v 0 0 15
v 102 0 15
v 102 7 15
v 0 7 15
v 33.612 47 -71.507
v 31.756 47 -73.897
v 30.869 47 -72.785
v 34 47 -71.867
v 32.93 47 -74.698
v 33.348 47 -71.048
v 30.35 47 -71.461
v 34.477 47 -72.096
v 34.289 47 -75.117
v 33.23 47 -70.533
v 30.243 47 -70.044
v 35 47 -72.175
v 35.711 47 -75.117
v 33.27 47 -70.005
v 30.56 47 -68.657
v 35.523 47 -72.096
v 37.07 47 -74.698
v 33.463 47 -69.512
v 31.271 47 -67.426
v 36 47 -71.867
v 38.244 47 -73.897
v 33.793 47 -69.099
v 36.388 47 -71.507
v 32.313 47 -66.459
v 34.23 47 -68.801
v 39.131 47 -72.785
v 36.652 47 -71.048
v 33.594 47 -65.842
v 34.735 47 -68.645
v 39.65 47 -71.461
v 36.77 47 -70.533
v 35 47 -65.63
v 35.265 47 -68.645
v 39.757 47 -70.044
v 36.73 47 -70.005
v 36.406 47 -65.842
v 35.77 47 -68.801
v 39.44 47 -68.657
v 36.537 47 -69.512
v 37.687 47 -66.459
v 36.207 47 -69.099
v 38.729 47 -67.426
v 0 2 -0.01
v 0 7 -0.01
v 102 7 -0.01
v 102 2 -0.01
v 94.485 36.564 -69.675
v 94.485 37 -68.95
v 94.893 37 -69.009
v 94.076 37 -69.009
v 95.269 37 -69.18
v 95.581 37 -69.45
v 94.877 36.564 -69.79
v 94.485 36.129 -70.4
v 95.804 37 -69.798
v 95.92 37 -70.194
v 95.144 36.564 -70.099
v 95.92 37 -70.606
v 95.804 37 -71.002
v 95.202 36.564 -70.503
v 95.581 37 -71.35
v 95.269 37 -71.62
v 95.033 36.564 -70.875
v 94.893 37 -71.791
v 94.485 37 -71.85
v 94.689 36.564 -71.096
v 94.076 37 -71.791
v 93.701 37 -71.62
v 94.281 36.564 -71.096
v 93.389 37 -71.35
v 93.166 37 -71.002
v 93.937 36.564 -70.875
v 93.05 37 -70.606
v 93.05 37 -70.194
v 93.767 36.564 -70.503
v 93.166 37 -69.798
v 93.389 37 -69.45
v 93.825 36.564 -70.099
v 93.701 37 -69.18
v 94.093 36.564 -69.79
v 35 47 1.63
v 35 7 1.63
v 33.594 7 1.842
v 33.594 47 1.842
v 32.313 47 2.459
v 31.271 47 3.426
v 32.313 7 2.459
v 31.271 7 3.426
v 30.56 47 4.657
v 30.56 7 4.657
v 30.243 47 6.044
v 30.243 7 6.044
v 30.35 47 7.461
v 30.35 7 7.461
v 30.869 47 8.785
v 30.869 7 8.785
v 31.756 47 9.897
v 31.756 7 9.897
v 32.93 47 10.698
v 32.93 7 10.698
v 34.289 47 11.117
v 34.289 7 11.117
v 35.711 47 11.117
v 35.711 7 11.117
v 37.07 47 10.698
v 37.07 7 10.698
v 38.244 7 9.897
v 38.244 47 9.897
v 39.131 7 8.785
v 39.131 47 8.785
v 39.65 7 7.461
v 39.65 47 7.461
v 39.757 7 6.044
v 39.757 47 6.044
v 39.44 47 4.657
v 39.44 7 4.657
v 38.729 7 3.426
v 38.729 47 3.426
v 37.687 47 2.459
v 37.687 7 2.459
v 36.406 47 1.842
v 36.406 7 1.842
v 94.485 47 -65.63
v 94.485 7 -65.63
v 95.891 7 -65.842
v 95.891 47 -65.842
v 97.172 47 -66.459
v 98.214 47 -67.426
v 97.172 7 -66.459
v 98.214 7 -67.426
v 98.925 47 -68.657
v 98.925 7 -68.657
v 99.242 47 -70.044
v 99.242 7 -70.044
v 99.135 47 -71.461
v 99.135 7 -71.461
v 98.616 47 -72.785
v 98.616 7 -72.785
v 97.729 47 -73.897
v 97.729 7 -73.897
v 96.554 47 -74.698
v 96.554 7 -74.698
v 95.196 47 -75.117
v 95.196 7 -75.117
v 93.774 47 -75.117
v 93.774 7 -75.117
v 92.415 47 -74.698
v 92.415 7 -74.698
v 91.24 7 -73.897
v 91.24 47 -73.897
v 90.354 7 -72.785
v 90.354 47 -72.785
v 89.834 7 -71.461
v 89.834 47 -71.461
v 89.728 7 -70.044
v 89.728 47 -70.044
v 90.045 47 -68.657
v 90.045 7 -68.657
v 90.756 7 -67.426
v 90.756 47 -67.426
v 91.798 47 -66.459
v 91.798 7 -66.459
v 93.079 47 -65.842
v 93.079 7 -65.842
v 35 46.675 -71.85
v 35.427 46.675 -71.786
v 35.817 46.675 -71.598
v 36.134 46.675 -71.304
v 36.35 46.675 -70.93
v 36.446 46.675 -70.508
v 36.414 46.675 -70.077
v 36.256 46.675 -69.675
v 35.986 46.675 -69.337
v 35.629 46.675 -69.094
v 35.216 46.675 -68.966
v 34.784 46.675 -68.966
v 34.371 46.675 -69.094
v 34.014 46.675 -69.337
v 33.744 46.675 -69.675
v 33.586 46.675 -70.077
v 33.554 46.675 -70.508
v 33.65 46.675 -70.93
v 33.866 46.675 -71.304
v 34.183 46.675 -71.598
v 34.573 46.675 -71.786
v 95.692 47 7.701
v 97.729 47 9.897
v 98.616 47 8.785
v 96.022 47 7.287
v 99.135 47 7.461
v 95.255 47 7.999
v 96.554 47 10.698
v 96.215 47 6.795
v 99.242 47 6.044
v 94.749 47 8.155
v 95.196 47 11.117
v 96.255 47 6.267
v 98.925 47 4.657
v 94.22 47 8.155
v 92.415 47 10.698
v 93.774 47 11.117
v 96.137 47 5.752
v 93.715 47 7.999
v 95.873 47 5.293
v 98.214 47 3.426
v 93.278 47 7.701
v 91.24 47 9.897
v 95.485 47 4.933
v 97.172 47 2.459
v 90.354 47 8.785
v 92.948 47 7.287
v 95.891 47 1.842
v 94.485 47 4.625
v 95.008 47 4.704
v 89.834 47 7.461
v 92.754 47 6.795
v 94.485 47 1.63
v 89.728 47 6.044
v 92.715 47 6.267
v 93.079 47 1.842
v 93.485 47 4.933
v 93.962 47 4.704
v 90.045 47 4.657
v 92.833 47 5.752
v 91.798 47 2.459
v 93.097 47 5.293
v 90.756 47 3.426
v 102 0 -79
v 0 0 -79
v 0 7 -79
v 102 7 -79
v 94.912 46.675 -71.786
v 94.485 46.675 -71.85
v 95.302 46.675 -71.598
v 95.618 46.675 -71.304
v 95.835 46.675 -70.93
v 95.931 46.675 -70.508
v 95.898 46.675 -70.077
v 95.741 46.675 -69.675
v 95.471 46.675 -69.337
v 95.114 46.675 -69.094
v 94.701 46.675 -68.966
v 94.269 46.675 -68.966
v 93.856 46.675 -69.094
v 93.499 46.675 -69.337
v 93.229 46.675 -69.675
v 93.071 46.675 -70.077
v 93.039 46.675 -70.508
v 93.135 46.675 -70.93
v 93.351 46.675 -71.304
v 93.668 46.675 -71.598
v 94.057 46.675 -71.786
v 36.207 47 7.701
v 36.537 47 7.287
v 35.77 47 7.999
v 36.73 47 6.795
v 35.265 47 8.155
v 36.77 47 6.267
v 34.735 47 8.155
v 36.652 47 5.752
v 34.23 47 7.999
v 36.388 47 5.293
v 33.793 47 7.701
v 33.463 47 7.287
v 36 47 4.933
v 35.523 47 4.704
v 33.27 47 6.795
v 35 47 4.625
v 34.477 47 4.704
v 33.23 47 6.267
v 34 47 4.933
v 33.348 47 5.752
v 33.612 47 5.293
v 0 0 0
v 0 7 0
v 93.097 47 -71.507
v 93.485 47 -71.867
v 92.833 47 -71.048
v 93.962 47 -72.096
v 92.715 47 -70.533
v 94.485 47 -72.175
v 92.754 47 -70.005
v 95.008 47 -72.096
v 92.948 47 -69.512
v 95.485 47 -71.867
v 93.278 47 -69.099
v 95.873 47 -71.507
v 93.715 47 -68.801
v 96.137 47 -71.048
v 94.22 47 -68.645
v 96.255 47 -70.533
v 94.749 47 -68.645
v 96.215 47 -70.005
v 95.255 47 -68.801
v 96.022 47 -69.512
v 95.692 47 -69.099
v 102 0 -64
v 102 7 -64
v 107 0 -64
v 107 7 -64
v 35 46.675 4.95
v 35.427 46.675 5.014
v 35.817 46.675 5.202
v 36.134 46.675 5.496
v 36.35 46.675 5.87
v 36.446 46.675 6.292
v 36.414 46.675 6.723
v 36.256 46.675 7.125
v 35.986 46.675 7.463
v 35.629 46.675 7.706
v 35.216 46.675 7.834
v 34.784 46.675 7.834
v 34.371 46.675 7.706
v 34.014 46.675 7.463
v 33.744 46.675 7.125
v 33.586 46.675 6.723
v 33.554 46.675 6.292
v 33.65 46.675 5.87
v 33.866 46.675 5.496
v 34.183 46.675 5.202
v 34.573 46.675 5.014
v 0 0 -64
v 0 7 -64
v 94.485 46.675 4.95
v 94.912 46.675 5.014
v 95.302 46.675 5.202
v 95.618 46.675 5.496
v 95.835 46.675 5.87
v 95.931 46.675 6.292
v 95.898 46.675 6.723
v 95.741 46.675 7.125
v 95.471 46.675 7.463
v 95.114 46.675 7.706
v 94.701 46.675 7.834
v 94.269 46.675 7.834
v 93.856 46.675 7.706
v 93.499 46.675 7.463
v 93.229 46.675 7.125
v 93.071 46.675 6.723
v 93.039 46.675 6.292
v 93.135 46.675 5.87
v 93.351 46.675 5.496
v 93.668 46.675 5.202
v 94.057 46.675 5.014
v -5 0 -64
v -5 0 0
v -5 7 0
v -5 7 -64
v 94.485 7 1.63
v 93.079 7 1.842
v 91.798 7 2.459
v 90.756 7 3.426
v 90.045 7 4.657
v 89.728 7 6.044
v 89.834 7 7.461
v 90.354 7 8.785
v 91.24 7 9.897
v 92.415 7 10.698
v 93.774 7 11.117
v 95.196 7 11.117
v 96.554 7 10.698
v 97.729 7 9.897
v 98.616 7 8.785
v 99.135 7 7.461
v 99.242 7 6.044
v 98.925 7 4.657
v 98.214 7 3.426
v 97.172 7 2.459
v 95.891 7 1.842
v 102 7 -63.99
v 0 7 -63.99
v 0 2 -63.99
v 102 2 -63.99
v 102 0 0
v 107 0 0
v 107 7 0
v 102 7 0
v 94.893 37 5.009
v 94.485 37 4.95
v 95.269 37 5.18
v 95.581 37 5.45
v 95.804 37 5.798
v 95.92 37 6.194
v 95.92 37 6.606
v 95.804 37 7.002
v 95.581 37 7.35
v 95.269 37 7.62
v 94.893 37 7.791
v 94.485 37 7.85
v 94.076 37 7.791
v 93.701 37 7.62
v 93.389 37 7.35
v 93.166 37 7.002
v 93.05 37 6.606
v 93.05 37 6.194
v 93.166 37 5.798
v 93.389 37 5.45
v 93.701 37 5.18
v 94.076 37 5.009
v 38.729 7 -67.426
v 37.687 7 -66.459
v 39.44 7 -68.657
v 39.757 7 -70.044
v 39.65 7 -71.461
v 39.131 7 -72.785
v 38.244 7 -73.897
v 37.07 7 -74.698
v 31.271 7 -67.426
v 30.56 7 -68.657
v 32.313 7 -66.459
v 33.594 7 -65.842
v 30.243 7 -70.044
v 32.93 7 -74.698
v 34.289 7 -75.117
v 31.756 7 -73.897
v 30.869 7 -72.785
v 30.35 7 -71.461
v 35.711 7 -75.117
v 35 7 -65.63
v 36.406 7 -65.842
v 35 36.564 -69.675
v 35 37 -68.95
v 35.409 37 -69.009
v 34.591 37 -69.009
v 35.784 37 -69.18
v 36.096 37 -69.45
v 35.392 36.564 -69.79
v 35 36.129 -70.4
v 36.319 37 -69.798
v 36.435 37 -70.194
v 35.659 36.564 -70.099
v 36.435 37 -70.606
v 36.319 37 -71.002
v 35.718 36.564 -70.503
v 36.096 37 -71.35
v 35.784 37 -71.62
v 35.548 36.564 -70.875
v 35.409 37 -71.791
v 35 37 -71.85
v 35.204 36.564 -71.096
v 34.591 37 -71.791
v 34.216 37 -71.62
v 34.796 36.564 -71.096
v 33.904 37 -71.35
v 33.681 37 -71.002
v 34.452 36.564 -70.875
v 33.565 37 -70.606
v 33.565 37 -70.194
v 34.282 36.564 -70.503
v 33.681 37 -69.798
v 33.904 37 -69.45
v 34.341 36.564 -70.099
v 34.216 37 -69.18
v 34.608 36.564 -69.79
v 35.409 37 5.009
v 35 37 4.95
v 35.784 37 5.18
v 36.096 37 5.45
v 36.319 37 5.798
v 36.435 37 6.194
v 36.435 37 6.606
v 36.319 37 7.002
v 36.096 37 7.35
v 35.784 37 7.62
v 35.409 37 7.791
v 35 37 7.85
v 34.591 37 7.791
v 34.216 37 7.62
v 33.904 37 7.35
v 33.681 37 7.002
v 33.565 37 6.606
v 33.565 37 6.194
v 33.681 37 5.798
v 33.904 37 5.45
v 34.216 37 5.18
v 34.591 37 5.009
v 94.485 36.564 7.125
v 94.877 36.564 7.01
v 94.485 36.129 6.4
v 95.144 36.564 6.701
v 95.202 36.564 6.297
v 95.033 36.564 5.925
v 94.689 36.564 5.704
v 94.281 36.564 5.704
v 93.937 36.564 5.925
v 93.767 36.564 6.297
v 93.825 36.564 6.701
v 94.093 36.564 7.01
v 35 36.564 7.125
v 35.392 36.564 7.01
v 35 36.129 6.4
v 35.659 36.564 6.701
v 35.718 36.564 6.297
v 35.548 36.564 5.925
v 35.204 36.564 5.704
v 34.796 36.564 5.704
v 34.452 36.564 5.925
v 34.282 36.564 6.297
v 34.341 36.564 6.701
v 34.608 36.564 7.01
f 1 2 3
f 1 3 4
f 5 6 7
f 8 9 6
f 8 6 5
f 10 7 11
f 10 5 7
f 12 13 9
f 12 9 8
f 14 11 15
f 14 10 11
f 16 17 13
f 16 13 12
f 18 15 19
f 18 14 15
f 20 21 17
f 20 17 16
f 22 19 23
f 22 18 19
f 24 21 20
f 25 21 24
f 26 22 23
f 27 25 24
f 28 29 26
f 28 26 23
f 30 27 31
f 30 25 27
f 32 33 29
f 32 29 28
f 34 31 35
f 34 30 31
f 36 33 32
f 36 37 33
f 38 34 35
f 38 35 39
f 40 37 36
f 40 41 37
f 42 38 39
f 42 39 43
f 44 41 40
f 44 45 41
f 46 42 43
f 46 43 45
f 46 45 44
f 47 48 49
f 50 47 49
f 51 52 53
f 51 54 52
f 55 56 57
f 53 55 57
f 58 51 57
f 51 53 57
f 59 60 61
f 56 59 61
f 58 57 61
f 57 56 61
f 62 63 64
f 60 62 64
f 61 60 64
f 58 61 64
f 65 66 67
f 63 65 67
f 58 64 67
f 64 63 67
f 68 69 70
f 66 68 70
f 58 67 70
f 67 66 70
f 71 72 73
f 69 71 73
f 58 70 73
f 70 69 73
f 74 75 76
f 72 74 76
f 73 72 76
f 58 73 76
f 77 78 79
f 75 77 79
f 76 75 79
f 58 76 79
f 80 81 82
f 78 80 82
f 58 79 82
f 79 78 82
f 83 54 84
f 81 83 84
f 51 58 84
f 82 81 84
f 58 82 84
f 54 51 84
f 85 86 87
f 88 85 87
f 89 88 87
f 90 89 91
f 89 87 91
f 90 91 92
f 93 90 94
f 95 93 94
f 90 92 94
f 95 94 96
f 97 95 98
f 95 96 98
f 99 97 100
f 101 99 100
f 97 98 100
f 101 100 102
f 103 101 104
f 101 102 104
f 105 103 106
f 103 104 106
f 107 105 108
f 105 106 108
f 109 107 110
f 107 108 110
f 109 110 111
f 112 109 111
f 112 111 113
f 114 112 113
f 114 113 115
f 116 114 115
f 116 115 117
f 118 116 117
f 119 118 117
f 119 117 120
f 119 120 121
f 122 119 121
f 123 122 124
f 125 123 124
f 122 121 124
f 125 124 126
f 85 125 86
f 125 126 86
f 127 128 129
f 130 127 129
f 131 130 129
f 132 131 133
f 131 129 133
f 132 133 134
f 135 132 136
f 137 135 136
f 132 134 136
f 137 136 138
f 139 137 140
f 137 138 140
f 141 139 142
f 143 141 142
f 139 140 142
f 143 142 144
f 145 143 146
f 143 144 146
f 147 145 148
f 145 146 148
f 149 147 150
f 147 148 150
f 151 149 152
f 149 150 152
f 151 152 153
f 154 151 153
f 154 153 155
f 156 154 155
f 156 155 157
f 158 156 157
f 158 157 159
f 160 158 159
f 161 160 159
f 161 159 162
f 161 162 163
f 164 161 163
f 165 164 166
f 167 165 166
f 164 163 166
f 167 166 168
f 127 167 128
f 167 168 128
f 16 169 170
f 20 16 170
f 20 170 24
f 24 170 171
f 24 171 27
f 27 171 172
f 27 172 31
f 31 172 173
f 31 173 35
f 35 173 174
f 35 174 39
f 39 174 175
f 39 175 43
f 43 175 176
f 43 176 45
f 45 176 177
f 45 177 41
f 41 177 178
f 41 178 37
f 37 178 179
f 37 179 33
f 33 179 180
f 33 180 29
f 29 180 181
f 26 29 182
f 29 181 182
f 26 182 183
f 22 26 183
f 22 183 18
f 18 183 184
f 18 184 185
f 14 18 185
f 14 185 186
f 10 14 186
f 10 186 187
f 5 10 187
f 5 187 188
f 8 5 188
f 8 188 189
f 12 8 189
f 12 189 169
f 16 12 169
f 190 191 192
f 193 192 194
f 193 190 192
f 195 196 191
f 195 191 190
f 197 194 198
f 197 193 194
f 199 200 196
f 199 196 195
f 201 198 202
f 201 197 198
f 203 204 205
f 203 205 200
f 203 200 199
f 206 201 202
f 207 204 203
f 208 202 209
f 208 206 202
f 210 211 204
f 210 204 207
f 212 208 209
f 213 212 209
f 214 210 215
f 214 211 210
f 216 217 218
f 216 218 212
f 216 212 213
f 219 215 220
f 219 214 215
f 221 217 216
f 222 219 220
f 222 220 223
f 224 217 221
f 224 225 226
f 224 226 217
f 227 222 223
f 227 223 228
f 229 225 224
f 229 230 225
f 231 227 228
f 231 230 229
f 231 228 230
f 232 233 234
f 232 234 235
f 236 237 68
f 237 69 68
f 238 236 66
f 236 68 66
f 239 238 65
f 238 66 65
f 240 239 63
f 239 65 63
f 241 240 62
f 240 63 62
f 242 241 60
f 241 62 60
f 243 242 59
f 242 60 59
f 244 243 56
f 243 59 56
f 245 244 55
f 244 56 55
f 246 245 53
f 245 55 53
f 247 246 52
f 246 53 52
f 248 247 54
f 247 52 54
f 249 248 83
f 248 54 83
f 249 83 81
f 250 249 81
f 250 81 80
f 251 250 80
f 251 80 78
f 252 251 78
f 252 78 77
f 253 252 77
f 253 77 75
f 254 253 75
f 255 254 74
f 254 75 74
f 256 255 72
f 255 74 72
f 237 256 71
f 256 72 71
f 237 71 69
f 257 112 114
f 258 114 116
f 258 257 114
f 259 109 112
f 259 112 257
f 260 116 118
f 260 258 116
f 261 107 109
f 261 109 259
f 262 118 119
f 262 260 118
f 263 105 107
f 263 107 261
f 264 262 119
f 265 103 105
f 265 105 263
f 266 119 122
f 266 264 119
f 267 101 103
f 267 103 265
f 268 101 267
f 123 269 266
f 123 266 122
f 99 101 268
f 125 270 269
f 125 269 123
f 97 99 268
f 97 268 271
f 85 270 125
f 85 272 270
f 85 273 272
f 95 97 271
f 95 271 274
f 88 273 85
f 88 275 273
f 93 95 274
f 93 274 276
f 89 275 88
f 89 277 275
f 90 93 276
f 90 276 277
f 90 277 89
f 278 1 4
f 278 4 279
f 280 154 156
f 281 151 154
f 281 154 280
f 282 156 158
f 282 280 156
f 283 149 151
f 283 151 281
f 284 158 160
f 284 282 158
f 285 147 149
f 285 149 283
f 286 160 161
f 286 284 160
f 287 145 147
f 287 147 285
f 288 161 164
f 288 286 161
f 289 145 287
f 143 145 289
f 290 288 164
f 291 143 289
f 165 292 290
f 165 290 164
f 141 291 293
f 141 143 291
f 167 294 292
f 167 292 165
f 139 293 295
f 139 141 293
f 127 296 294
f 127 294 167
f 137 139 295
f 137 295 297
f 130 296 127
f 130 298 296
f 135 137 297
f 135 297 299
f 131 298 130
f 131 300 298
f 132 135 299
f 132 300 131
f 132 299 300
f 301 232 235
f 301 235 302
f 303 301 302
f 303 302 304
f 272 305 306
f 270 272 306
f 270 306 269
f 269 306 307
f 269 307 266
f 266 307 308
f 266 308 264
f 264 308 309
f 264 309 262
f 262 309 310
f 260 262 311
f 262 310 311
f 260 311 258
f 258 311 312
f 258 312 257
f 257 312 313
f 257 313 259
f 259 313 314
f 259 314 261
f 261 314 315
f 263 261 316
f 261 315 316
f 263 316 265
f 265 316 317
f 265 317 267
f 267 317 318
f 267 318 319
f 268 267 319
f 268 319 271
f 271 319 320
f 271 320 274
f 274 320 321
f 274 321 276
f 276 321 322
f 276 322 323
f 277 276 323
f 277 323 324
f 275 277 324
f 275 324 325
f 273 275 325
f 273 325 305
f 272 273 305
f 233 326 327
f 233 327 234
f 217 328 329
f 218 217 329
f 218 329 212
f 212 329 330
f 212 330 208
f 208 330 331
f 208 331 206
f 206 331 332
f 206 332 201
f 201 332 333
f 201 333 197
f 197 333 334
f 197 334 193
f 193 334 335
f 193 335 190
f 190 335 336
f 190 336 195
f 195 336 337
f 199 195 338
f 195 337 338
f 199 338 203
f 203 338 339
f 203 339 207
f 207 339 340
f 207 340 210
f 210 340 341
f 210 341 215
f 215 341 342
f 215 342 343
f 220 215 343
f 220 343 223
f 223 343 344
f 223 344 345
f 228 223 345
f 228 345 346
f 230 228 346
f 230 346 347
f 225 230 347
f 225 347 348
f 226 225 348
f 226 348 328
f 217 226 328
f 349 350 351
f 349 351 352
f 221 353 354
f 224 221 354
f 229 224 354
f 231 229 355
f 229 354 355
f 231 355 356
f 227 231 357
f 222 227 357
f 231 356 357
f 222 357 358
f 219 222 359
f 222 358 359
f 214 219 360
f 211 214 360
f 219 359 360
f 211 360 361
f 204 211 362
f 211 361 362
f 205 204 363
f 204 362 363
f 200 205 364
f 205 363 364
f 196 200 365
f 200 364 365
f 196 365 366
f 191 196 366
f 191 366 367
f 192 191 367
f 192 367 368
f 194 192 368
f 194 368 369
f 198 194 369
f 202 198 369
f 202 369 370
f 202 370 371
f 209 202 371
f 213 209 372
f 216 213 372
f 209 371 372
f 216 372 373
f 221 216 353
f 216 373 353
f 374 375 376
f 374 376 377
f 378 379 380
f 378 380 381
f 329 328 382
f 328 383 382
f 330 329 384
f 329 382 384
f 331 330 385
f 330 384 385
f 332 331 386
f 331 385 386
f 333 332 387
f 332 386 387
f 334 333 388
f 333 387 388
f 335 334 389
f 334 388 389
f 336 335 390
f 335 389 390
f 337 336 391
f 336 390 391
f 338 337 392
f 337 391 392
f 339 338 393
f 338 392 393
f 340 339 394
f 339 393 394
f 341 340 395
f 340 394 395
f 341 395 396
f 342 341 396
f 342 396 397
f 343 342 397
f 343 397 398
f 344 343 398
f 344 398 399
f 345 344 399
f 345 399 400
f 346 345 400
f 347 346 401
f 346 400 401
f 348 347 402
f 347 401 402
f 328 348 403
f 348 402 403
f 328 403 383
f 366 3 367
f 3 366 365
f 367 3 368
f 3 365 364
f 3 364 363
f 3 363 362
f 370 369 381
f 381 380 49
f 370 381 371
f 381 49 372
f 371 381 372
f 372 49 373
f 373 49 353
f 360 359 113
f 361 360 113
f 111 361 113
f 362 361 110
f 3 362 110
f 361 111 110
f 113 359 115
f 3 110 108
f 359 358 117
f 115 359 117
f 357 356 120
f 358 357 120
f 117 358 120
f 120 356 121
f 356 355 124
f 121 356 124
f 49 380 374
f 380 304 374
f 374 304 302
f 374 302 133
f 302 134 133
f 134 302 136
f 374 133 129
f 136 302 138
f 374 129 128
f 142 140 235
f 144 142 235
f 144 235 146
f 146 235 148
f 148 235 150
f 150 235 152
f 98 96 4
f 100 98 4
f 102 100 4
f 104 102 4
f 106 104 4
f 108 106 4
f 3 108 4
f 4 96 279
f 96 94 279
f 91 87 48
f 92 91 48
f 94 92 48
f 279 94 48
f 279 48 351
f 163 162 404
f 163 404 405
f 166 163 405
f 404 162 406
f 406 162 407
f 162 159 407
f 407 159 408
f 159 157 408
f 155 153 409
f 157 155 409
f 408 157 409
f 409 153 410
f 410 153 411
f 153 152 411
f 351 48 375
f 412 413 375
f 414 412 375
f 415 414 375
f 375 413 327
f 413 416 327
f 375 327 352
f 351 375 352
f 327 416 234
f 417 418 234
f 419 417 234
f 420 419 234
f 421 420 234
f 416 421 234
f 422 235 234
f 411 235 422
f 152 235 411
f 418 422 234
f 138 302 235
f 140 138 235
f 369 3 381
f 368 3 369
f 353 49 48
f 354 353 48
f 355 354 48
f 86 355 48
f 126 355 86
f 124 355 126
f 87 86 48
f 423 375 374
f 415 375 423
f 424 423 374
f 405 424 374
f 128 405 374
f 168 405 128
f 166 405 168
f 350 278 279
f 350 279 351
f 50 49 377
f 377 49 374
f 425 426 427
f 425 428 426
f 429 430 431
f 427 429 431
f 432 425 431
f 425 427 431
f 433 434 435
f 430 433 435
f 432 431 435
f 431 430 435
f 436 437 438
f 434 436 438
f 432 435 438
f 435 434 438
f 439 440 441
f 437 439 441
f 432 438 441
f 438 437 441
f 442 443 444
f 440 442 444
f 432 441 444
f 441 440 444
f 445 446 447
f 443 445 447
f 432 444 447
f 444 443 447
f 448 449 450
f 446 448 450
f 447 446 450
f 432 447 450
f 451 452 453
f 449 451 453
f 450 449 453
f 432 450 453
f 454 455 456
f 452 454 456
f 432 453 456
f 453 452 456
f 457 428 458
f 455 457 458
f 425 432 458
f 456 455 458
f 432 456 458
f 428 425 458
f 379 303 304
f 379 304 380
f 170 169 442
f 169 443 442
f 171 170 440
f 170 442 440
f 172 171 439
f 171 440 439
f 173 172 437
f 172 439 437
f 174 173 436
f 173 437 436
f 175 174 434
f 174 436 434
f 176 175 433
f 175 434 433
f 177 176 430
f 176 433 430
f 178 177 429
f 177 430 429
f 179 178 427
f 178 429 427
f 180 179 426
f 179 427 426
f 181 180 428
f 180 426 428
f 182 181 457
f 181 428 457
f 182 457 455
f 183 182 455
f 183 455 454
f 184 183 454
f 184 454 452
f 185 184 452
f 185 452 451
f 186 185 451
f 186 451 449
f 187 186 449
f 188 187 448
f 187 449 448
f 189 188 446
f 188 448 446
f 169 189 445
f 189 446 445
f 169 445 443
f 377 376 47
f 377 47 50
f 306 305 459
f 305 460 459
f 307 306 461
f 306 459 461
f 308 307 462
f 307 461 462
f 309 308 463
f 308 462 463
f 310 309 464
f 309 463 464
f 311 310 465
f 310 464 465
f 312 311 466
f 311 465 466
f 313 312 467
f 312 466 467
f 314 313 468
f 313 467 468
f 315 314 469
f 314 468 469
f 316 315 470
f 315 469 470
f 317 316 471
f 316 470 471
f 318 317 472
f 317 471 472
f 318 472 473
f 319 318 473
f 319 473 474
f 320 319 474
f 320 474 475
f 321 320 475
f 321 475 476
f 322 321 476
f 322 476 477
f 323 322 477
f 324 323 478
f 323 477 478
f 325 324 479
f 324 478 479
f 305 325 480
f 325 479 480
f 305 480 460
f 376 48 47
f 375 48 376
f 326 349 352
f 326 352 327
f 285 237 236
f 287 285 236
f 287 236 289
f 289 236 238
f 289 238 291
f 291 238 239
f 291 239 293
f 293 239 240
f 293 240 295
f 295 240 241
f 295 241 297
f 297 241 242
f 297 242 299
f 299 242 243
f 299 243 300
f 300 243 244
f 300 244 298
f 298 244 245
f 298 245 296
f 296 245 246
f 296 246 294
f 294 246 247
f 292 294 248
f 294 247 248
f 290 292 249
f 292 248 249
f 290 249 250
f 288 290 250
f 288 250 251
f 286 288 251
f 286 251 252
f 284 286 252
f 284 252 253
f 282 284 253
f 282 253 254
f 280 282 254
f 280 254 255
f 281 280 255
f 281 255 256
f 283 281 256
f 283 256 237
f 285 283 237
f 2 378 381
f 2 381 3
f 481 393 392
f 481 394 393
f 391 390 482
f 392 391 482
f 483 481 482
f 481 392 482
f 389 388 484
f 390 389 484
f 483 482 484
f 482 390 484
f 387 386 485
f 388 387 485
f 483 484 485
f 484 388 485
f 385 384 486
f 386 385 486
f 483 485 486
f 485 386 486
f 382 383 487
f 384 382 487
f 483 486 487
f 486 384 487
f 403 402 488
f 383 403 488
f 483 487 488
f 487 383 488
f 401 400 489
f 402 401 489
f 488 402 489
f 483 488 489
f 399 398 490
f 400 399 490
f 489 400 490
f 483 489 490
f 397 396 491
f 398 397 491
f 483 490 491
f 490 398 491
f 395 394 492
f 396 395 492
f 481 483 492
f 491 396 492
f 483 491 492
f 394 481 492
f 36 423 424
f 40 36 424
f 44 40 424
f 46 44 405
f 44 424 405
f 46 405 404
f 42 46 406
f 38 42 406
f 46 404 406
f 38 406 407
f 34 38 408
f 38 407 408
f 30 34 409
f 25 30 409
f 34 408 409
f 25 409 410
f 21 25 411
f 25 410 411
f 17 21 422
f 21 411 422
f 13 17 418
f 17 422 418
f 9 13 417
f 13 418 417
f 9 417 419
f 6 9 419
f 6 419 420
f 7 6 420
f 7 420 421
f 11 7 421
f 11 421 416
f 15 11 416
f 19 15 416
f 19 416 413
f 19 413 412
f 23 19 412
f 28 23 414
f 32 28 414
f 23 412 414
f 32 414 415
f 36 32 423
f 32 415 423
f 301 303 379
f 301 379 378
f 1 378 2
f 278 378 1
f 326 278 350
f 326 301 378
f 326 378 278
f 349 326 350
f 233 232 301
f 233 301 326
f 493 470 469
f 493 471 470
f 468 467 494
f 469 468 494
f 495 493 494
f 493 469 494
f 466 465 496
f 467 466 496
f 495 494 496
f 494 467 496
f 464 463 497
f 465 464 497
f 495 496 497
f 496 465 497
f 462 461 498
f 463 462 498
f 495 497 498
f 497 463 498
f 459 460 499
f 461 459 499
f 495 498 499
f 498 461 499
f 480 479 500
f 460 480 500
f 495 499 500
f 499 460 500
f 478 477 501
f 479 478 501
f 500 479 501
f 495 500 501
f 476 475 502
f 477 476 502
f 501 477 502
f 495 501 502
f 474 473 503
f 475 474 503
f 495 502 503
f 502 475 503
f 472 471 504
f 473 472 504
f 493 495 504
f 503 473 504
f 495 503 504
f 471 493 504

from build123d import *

# Parameters (mm, degrees)
EXTRUDE_7_DEPTH                = 7
SKETCH_3_W                     = 102
SKETCH_3_H                     = 63.98
CUT_EXTRUDE_5_DEPTH            = 5
SKETCH_11_R                    = 4.77
EXTRUDE_8_DEPTH                = 40
HOLE_WIZARD_M3_5_2_D           = 2.9
HOLE_WIZARD_M3_5_2_DEPTH       = 10
HOLE_WIZARD_M3_5_2_CSINK_D     = 3.55
HOLE_WIZARD_M3_5_2_CSINK_ANGLE = 90
HOLE_WIZARD_M3_5_2_TIP         = 0.871247898


with BuildPart() as part:
    # 草图1 → 凸台-拉伸7 (new body)
    with BuildSketch(Plane(origin=(0, 0, 0), x_dir=(1, 0, 0), z_dir=(0, 1, 0))):
        Polygon((0, 64), (0, 79), (102, 79), (102, 64), (107, 64), (107, 0), (102, 0), (102, -15), (0, -15), (0, 0), (-5, 0), (-5, 64), align=None)
    extrude(amount=EXTRUDE_7_DEPTH)

    # 草图3 → 切除-拉伸5 (cut)
    with BuildSketch(Plane(origin=(0, 7, 0), x_dir=(1, 0, 0), z_dir=(0, 1, 0))):
        with Locations((51, 32)):
            Rectangle(SKETCH_3_W, SKETCH_3_H)
    extrude(amount=-CUT_EXTRUDE_5_DEPTH, mode=Mode.SUBTRACT)

    # 草图11 → 凸台-拉伸8 (add)
    with BuildSketch(Plane(origin=(0, 7, 0), x_dir=(1, 0, 0), z_dir=(0, 1, 0))):
        with Locations(Location((35, 70.4, 0), (0, 0, 270))):
            Circle(SKETCH_11_R)
        with Locations(Location((94.484841374, 70.4, 0), (0, 0, 270))):
            Circle(SKETCH_11_R)
        with Locations(Location((94.484841374, -6.4, 0), (0, 0, 90))):
            Circle(SKETCH_11_R)
        with Locations(Location((35, -6.4, 0), (0, 0, 90))):
            Circle(SKETCH_11_R)
    extrude(amount=EXTRUDE_8_DEPTH)

    # M3.5 螺纹孔2
    with Locations(Plane(origin=(35, 47, -70.4), x_dir=(0, 0, 1), z_dir=(0, 1, 0))):
        with Locations((0, 0), (0, 59.484841374), (76.8, 59.484841374), (76.8, 0)):
            CounterSinkHole(HOLE_WIZARD_M3_5_2_D / 2, HOLE_WIZARD_M3_5_2_CSINK_D / 2, depth=HOLE_WIZARD_M3_5_2_DEPTH, counter_sink_angle=HOLE_WIZARD_M3_5_2_CSINK_ANGLE)
            with Locations((0, 0, -(HOLE_WIZARD_M3_5_2_DEPTH + HOLE_WIZARD_M3_5_2_TIP / 2))):  # 118° drill point
                Cone(0, HOLE_WIZARD_M3_5_2_D / 2, HOLE_WIZARD_M3_5_2_TIP, mode=Mode.SUBTRACT)


solid = part.part
